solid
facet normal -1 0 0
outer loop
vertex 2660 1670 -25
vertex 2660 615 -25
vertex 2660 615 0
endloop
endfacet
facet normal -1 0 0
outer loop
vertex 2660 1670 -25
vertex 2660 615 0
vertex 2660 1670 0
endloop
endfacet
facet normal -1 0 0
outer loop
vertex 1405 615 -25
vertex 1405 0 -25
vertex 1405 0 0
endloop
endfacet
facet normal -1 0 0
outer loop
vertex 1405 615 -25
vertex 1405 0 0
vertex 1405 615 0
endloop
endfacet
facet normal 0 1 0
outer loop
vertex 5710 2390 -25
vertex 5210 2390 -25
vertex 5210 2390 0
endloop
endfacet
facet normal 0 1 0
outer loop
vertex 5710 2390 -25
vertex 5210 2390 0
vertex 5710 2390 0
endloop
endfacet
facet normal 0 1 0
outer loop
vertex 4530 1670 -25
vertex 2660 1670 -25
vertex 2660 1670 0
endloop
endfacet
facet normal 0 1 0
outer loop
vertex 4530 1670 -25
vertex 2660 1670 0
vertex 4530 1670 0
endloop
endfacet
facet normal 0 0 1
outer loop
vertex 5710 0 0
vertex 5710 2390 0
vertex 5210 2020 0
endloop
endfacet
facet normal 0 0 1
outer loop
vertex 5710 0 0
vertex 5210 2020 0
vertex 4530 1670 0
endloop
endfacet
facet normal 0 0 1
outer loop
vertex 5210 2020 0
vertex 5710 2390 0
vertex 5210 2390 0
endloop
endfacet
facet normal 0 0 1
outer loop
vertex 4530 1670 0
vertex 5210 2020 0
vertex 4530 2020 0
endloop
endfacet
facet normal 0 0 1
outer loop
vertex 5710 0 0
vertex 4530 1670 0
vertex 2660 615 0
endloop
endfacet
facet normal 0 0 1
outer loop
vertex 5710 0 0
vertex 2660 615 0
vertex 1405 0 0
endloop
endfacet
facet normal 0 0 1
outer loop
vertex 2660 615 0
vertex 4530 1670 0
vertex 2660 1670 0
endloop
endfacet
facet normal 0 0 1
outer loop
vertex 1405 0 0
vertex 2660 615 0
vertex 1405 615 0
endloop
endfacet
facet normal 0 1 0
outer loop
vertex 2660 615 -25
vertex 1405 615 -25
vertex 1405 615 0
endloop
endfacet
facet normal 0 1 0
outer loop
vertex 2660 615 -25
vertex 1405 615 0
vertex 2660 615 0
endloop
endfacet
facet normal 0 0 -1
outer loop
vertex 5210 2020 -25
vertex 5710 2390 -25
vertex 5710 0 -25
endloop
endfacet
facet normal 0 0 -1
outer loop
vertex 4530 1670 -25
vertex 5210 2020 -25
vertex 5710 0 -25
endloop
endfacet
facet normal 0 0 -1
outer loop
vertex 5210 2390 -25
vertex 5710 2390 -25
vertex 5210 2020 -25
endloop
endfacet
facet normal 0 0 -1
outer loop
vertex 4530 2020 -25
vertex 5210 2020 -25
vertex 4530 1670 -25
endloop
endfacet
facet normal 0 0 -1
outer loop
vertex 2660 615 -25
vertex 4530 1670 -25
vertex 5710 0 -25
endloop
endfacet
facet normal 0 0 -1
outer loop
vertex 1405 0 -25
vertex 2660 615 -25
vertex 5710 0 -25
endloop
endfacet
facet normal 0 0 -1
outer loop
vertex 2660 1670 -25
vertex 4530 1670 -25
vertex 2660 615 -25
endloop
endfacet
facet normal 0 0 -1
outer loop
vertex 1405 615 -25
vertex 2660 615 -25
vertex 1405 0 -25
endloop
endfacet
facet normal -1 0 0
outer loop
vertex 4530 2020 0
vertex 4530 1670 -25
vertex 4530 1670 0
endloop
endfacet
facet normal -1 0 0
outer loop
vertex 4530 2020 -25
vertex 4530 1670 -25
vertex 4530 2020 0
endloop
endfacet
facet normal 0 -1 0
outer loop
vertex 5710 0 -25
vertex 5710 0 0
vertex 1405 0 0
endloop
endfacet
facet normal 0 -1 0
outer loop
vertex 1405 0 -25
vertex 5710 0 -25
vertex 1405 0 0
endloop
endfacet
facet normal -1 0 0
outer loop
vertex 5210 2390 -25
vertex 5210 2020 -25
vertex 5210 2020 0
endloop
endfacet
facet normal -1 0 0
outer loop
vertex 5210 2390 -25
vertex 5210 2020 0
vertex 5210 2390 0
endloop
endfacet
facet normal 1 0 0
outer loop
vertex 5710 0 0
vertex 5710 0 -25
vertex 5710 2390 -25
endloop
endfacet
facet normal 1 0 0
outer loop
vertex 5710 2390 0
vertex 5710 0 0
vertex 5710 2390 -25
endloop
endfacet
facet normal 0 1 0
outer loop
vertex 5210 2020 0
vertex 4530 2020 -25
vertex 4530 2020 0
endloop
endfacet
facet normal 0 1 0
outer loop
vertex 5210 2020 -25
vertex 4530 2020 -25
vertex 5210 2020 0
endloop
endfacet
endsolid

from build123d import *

# Parameters (mm, degrees)
TABAN_FLAN_1_DEPTH         = 25
KES_EKSTR_ZYON1_DEPTH      = 6508.676543898
KES_EKSTR_ZYON1_DEPTH_BACK = 6508.676543898
IZIM7_W                    = 1400
IZIM7_H                    = 1895
IZIM7_W_2                  = 310
IZIM7_H_2                  = 495
KES_EKSTR_ZYON2_DEPTH      = 6508.676543898
KES_EKSTR_ZYON2_DEPTH_BACK = 6508.676543898
IZIM8_W                    = 292
IZIM8_H                    = 2515
KES_EKSTR_ZYON3_DEPTH      = 6240.38698912
KES_EKSTR_ZYON3_DEPTH_BACK = 6240.38698912
IZIM10_W                   = 2900
IZIM10_H                   = 350
KES_EKSTR_ZYON4_DEPTH      = 6240.38698912
KES_EKSTR_ZYON4_DEPTH_BACK = 6240.38698912
KES_EKSTR_ZYON5_DEPTH      = 6191.05856192
KES_EKSTR_ZYON5_DEPTH_BACK = 6191.05856192
IZIM12_W                   = 5
IZIM12_H                   = 615


# Sheet-metal steps are written as plain solids
with BuildPart() as part:
    # Çizim1 → Taban-Flanş1 (new body)
    with BuildSketch(Plane.XY):
        Polygon((0, 0), (0, 1895), (2935, 1895), (2935, 2020), (4900, 2020), (4900, 2515), (6002, 2515), (6002, 0), align=None)
    extrude(amount=-TABAN_FLAN_1_DEPTH)

    # Çizim7 → Kes-Ekstrüzyon1 (cut, two sides: drawn at the far end of the back side and taken through both)
    with BuildSketch(Plane.XY.offset(-KES_EKSTR_ZYON1_DEPTH_BACK)):
        with Locations((700, 947.5)):
            Rectangle(IZIM7_W, IZIM7_H)
        with Locations((5055, 2267.5)):
            Rectangle(IZIM7_W_2, IZIM7_H_2)
    extrude(amount=KES_EKSTR_ZYON1_DEPTH + KES_EKSTR_ZYON1_DEPTH_BACK, mode=Mode.SUBTRACT)

    # Çizim8 → Kes-Ekstrüzyon2 (cut, two sides: drawn at the far end of the back side and taken through both)
    with BuildSketch(Plane.XY.offset(-KES_EKSTR_ZYON2_DEPTH_BACK)):
        with Locations((5856, 1257.5)):
            Rectangle(IZIM8_W, IZIM8_H)
    extrude(amount=KES_EKSTR_ZYON2_DEPTH + KES_EKSTR_ZYON2_DEPTH_BACK, mode=Mode.SUBTRACT)

    # Çizim10 → Kes-Ekstrüzyon3 (cut, two sides: drawn at the far end of the back side and taken through both)
    with BuildSketch(Plane.XY.offset(-KES_EKSTR_ZYON3_DEPTH_BACK)):
        with Locations((2850, 1845)):
            Rectangle(IZIM10_W, IZIM10_H)
    extrude(amount=KES_EKSTR_ZYON3_DEPTH + KES_EKSTR_ZYON3_DEPTH_BACK, mode=Mode.SUBTRACT)

    # Çizim11 → Kes-Ekstrüzyon4 (cut, two sides: drawn at the far end of the back side and taken through both)
    with BuildSketch(Plane.XY.offset(-KES_EKSTR_ZYON4_DEPTH_BACK)):
        Polygon((4300, 1670), (4530, 1670), (4530, 2020), (5210, 2020), (5210, 2390), (5710, 2390), (5778.630385148, 2406.496682207), (5749.815338653, 2697.266696836), (5189.231706845, 2697.266696836), (4530, 2199.552257381), (4300, 2199.552257381), align=None)
    extrude(amount=KES_EKSTR_ZYON4_DEPTH + KES_EKSTR_ZYON4_DEPTH_BACK, mode=Mode.SUBTRACT)

    # Çizim12 → Kes-Ekstrüzyon5 (cut, two sides: drawn at the far end of the back side and taken through both)
    with BuildSketch(Plane.XY.offset(-KES_EKSTR_ZYON5_DEPTH_BACK)):
        Polygon((2660, 1670), (1400, 1670), (1400, 615), (1405, 615), (2660, 615), align=None)
        with Locations((1402.5, 307.5)):
            Rectangle(IZIM12_W, IZIM12_H)
    extrude(amount=KES_EKSTR_ZYON5_DEPTH + KES_EKSTR_ZYON5_DEPTH_BACK, mode=Mode.SUBTRACT)


solid = part.part
